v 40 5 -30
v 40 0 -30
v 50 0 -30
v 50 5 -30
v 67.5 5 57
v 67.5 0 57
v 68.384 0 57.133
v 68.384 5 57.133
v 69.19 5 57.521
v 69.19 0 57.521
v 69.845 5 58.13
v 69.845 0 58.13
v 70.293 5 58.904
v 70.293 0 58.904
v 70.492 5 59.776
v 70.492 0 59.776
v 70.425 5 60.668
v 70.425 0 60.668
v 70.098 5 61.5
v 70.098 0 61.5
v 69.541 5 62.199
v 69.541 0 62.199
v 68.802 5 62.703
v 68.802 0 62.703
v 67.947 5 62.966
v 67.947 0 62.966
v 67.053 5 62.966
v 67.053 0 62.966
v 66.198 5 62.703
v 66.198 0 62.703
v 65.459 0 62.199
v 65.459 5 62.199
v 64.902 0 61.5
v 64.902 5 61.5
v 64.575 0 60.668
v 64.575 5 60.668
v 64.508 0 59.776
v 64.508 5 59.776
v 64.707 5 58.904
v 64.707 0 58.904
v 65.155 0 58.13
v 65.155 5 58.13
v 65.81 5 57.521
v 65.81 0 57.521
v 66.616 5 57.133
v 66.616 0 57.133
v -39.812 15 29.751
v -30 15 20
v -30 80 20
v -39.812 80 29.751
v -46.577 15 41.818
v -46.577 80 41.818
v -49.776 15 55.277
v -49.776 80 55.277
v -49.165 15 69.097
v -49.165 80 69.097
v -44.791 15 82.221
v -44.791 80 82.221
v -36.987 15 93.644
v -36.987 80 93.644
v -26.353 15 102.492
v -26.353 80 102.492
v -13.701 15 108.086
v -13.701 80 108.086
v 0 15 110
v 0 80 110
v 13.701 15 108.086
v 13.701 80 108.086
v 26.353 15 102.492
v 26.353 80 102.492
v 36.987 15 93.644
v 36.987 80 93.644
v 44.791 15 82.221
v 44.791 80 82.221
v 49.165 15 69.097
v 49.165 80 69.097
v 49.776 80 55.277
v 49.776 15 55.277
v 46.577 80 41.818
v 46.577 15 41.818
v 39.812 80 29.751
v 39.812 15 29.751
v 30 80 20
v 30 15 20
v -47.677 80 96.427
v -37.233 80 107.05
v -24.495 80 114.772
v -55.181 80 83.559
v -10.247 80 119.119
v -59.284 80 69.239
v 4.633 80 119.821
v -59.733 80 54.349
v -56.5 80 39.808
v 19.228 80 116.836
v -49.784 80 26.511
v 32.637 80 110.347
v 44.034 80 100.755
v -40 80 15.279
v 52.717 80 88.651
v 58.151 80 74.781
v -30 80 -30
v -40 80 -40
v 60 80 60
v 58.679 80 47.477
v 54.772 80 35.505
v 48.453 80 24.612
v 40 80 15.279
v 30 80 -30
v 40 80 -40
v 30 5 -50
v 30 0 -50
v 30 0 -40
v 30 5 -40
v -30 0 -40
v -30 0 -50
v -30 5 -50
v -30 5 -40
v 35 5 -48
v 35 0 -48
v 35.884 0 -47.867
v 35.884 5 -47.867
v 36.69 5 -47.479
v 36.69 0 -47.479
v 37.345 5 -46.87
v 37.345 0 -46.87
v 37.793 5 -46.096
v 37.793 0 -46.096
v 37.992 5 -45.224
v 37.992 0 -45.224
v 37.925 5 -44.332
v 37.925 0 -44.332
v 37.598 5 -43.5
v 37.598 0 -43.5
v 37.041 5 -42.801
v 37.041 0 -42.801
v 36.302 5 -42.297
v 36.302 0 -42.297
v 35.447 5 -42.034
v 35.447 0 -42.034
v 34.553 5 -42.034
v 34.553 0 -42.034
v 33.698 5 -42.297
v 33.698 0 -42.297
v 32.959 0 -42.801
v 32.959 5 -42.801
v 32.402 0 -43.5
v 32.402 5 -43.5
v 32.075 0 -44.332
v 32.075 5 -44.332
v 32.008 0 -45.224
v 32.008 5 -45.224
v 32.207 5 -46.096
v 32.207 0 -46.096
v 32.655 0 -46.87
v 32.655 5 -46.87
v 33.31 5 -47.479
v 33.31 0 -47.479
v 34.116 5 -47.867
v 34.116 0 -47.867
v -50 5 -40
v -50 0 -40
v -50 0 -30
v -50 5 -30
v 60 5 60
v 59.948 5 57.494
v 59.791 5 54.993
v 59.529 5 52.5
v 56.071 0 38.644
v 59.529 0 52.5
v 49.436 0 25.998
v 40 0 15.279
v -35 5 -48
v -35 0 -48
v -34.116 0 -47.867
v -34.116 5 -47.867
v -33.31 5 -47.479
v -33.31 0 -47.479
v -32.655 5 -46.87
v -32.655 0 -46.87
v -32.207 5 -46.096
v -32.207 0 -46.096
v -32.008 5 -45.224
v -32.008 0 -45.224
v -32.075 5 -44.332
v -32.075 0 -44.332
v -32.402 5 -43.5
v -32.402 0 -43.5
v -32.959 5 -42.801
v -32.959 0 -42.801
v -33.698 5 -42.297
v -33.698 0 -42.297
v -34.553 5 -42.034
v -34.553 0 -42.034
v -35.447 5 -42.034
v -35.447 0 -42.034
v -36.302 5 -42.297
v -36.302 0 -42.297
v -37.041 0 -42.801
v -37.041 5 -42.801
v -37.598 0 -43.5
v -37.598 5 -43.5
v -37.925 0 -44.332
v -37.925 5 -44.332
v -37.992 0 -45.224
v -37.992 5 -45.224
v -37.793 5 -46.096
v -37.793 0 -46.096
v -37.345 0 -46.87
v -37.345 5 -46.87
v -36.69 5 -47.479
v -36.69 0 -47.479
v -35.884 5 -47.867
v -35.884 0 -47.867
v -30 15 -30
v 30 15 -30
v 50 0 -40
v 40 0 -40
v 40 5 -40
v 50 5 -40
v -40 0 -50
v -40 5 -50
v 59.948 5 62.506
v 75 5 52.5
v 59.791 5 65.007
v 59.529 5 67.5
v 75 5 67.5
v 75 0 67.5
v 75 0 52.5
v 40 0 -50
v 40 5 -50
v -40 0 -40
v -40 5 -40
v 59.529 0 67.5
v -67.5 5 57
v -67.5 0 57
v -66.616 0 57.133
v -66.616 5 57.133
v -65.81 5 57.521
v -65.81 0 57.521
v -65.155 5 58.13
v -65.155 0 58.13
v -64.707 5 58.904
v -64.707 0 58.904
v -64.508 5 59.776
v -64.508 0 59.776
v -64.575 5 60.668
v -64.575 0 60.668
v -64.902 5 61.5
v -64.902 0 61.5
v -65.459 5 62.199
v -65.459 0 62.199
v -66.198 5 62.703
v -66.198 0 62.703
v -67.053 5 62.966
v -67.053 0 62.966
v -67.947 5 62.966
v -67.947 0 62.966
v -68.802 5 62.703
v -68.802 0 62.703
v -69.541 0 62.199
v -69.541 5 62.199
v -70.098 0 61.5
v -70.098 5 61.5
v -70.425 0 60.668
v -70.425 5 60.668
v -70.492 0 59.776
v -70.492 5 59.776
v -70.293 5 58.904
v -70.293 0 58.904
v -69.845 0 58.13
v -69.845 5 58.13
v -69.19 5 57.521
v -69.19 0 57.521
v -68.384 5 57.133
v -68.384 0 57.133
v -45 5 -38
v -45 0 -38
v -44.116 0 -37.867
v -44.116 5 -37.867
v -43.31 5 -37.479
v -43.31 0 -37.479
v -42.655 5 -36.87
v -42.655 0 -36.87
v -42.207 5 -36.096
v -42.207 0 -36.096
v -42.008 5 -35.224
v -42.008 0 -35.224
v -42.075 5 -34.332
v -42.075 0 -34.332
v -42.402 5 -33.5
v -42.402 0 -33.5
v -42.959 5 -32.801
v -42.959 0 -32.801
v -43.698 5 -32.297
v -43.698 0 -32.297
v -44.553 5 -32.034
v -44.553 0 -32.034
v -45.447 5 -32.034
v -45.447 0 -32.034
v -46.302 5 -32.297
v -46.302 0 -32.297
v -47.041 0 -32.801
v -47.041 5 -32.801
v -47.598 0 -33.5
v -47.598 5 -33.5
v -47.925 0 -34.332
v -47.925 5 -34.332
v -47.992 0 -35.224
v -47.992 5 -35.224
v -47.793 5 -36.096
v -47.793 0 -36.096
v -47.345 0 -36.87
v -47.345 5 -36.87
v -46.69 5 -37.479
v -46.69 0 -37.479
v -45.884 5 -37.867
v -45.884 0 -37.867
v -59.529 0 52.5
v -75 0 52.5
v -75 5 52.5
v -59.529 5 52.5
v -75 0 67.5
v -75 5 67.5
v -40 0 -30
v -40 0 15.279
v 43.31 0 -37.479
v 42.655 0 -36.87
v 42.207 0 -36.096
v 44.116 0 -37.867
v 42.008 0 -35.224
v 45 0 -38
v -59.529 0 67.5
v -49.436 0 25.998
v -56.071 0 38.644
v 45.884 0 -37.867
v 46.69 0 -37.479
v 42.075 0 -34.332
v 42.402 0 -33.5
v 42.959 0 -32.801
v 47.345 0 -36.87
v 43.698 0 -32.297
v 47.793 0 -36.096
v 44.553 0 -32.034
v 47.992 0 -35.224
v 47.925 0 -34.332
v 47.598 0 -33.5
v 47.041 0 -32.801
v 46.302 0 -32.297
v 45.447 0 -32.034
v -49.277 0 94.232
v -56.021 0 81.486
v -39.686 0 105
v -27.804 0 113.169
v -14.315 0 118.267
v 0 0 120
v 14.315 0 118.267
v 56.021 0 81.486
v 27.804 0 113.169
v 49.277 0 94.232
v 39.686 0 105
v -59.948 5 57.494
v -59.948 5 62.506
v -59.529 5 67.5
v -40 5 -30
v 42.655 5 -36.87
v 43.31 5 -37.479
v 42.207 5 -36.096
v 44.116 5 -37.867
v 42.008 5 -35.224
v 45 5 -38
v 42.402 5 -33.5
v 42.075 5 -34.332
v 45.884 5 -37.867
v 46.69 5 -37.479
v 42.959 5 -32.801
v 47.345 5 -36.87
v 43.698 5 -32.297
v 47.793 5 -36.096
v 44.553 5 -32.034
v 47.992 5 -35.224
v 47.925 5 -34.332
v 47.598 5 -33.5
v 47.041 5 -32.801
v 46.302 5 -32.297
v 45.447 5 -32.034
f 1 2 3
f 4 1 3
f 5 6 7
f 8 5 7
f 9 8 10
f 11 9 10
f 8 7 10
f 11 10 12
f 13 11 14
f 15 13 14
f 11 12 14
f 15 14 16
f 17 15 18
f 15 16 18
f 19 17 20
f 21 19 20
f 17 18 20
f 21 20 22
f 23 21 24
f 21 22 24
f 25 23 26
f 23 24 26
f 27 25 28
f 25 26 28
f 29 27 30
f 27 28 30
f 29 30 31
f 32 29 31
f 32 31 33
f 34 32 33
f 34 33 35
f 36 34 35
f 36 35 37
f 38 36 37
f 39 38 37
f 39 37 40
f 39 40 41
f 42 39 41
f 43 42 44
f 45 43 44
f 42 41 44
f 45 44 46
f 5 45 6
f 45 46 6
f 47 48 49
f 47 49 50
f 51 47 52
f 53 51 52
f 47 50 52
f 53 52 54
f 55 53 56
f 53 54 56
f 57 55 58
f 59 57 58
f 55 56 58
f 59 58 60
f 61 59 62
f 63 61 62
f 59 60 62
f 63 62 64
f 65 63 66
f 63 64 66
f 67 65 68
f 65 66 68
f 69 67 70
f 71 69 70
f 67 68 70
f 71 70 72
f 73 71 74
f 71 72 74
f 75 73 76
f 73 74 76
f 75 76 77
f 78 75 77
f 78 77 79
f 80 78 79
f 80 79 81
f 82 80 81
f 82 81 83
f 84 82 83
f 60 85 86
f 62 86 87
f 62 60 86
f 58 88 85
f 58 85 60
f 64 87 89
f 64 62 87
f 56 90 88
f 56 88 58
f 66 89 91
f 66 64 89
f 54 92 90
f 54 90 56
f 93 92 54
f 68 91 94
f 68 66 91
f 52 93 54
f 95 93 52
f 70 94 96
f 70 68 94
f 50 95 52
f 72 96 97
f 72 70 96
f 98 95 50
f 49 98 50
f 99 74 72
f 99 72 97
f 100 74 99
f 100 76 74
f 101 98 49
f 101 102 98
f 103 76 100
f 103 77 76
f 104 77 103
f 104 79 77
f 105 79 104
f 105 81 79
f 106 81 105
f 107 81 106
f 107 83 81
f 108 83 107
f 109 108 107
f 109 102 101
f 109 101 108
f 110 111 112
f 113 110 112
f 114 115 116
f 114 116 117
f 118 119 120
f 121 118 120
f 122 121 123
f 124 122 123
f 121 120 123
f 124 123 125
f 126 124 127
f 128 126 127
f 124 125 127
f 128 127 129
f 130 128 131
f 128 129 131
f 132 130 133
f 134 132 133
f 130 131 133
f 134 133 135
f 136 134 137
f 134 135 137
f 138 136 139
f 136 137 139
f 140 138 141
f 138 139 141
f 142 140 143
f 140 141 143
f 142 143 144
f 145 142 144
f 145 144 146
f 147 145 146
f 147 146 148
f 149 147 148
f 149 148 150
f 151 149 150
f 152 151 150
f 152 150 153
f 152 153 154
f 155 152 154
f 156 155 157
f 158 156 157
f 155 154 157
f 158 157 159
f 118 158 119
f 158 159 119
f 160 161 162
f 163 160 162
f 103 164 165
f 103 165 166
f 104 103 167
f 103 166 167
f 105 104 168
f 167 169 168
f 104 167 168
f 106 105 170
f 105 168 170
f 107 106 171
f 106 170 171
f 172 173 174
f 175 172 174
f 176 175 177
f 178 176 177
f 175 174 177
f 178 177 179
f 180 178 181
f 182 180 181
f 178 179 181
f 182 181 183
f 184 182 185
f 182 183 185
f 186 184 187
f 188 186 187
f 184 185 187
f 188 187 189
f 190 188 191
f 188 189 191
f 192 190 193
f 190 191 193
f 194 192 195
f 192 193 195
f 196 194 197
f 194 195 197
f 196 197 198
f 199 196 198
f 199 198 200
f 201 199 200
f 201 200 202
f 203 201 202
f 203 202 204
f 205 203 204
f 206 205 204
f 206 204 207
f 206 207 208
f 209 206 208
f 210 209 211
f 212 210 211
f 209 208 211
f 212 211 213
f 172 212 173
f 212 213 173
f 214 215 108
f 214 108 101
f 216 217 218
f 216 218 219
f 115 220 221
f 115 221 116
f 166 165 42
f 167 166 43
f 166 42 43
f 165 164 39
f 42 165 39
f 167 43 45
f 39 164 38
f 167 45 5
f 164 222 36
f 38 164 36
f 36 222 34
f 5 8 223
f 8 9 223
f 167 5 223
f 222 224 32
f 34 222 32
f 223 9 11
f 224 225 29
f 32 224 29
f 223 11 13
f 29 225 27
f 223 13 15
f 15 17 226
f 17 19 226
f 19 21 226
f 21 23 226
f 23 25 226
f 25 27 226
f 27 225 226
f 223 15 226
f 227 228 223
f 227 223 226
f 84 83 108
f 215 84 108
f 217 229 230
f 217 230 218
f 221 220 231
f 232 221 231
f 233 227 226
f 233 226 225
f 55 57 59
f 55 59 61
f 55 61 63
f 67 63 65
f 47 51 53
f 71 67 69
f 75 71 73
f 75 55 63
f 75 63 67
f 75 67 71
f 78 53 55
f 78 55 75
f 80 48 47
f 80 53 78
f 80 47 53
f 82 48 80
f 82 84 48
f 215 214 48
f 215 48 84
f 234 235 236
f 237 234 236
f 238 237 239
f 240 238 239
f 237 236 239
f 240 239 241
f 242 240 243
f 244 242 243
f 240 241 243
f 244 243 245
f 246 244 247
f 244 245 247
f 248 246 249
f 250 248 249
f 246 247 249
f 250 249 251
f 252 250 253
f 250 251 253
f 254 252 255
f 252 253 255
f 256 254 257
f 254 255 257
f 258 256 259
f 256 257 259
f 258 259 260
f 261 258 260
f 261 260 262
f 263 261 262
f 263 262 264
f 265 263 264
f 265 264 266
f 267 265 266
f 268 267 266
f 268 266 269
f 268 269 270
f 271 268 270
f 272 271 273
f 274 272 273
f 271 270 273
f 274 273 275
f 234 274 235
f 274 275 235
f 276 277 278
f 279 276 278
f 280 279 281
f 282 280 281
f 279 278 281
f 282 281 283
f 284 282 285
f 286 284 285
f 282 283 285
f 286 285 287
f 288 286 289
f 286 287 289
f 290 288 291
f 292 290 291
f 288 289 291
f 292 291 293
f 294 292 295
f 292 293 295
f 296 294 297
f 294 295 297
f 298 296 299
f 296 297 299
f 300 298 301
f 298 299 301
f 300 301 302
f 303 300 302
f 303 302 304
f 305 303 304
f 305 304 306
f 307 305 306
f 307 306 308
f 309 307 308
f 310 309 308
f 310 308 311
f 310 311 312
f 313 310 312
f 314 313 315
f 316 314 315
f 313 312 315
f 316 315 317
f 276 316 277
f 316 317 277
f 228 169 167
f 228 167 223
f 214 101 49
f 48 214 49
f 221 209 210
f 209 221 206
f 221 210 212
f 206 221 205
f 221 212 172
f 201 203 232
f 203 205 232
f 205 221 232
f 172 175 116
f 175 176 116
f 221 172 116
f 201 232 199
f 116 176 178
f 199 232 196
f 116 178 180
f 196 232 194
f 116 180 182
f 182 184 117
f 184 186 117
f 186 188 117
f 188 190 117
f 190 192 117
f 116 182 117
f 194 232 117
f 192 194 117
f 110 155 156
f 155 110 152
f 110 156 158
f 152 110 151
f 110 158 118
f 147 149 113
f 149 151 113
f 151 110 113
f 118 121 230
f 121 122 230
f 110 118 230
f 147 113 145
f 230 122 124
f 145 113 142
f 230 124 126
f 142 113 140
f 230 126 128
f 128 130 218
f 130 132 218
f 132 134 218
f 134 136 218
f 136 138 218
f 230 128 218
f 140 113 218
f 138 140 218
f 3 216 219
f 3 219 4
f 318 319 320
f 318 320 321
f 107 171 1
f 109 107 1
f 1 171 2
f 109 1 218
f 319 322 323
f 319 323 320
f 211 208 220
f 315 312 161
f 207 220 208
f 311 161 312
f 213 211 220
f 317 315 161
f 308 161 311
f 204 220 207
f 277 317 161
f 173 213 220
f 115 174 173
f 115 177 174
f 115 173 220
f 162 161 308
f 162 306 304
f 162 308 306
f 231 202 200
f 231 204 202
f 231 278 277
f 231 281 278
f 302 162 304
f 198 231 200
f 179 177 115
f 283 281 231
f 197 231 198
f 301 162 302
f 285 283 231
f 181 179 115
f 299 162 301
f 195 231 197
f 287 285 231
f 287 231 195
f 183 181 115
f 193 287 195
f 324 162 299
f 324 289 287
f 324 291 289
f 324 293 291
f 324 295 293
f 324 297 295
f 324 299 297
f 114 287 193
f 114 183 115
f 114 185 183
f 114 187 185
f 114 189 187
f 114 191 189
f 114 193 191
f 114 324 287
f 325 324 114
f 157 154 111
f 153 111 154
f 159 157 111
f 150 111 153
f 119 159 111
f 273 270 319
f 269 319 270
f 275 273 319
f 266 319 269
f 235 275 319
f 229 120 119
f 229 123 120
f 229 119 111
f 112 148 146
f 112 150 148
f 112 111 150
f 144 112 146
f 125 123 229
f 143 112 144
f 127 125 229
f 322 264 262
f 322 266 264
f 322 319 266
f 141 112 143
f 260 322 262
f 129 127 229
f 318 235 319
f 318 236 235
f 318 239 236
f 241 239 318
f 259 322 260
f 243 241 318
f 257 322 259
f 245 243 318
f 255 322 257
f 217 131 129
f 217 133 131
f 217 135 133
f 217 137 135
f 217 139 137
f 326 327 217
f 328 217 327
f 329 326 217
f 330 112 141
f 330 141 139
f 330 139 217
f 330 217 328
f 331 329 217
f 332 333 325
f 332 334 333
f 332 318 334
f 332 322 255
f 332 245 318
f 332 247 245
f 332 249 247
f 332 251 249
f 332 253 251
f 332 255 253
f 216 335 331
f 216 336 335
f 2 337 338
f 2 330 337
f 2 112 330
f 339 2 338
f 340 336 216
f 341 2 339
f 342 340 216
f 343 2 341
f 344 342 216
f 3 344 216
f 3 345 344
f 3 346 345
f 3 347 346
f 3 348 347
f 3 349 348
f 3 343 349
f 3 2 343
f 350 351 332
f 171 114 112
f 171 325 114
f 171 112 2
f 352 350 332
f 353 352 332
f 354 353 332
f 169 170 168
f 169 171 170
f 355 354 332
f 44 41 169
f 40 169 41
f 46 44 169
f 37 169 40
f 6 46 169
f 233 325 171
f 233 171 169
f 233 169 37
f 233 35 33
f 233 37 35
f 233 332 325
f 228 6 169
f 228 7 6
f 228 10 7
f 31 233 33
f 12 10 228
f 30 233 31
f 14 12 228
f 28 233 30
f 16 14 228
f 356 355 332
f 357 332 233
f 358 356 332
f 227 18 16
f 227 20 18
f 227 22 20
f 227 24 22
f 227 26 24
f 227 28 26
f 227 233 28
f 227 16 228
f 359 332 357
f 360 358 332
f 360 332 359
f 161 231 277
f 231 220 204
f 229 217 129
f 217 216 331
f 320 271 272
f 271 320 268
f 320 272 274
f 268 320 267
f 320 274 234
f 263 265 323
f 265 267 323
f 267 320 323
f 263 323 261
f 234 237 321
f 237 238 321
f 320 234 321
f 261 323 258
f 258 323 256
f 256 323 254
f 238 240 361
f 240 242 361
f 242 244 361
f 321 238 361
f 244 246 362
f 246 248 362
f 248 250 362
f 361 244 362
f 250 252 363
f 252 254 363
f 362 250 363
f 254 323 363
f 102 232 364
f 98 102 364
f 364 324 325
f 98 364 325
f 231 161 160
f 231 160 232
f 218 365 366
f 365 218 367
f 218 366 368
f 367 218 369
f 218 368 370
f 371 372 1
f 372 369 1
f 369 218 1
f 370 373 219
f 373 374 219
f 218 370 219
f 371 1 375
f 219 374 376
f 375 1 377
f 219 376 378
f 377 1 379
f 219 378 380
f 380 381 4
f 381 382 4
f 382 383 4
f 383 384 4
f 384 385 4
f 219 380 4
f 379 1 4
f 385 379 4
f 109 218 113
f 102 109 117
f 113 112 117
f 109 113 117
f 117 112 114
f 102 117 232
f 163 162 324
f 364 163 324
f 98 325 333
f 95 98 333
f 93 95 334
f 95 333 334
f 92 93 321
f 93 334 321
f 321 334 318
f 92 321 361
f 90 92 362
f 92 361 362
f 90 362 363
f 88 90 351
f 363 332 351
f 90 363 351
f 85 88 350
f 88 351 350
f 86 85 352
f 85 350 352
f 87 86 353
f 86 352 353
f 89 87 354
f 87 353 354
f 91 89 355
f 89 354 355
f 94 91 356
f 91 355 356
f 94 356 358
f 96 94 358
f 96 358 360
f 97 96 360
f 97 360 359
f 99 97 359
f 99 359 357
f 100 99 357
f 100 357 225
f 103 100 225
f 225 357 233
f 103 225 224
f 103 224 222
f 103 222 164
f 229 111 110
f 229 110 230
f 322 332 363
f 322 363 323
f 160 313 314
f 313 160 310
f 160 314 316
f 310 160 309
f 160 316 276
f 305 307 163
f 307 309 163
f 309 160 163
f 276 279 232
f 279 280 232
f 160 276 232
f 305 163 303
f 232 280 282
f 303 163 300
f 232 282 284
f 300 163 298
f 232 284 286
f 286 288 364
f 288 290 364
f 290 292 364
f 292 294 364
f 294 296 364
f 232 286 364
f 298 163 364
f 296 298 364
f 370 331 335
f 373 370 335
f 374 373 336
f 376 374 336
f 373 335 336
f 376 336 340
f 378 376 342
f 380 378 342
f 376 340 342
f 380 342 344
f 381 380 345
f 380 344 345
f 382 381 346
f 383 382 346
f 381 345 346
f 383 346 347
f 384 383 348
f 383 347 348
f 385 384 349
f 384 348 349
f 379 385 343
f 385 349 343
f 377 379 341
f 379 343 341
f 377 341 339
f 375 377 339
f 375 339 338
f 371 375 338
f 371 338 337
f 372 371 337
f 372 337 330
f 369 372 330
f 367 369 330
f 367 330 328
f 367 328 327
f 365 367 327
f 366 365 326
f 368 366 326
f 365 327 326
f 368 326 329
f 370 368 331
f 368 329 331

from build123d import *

# Parameters (mm, degrees)
BOSS_EXTRUDE1_DEPTH = 80
CUT_EXTRUDE1_DEPTH  = 65
SKETCH3_R           = 3
SKETCH3_W           = 10
SKETCH3_H           = 10
BOSS_EXTRUDE2_DEPTH = 5


with BuildPart() as part:
    # Sketch1 → Boss-Extrude1 (new body)
    with BuildSketch(Plane(origin=(0, 0, 0), x_dir=(1, 0, 0), z_dir=(0, 1, 0))):
        with BuildLine():
            Line((-40, -40), (-40, -15.27864045))
            ThreePointArc((-40, -15.27864045), (-24.494897428, -114.772255751), (60, -60))
            ThreePointArc((60, -60), (54.772255751, -35.505102572), (40, -15.27864045))
            Line((40, -15.27864045), (40, -40))
            Line((40, -40), (-40, -40))
        make_face()
        with BuildLine():
            ThreePointArc((40, -15.27864045), (0, 0), (-40, -15.27864045))
            Line((-40, -15.27864045), (-40, -40))
            Line((-40, -40), (40, -40))
            Line((40, -40), (40, -15.27864045))
        make_face()
        with BuildLine():
            Line((40, 40), (-40, 40))
            Line((-40, 40), (-40, -15.27864045))
            ThreePointArc((-40, -15.27864045), (0, 0), (40, -15.27864045))
            Line((40, -15.27864045), (40, 40))
        make_face()
    extrude(amount=BOSS_EXTRUDE1_DEPTH)

    # Sketch2 → Cut-Extrude1 (cut)
    with BuildSketch(Plane(origin=(0, 80, 0), x_dir=(1, 0, 0), z_dir=(0, 1, 0))):
        with BuildLine():
            Line((30, 30), (-30, 30))
            Line((-30, 30), (-30, -20))
            ThreePointArc((-30, -20), (0, -10), (30, -20))
            Line((30, -20), (30, 30))
        make_face()
        with BuildLine():
            ThreePointArc((30, -20), (0, -10), (-30, -20))
            Line((-30, -20), (-30, -30))
            Line((-30, -30), (30, -30))
            Line((30, -30), (30, -20))
        make_face()
        with BuildLine():
            Line((-30, -30), (-30, -20))
            ThreePointArc((-30, -20), (-22.360679775, -104.72135955), (50, -60))
            ThreePointArc((50, -60), (44.72135955, -37.639320225), (30, -20))
            Line((30, -20), (30, -30))
            Line((30, -30), (-30, -30))
        make_face()
    extrude(amount=-CUT_EXTRUDE1_DEPTH, mode=Mode.SUBTRACT)

    # Sketch3 → Boss-Extrude2 (add)
    # profile 1 of 6: a face of its own
    with BuildSketch(Plane.XZ):
        with BuildLine():
            Line((-75, 52.5), (-59.529404499, 52.5))
            ThreePointArc((-59.529404499, 52.5), (-60, 60), (-59.529404499, 67.5))
            Line((-59.529404499, 67.5), (-75, 67.5))
            Line((-75, 67.5), (-75, 52.5))
        make_face()
        with Locations(Location((-67.5, 60, 0), (0, 0, 270))):
            Circle(SKETCH3_R, mode=Mode.SUBTRACT)
    # profile 2 of 6: a face of its own
    with BuildSketch(Plane.XZ):
        with BuildLine():
            ThreePointArc((59.529404499, 67.5), (60, 60), (59.529404499, 52.5))
            Line((59.529404499, 52.5), (75, 52.5))
            Line((75, 52.5), (75, 67.5))
            Line((75, 67.5), (59.529404499, 67.5))
        make_face()
        with Locations(Location((67.5, 60, 0), (0, 0, 270))):
            Circle(SKETCH3_R, mode=Mode.SUBTRACT)
    # profile 3 of 6: a face of its own
    with BuildSketch(Plane.XZ):
        with Locations((-45, -35)):
            Rectangle(SKETCH3_W, SKETCH3_H)
        with Locations(Location((-45, -35, 0), (0, 0, 270))):
            Circle(SKETCH3_R, mode=Mode.SUBTRACT)
    # profile 4 of 6: a face of its own
    with BuildSketch(Plane.XZ):
        with Locations((-35, -45)):
            Rectangle(SKETCH3_W, SKETCH3_H)
        with Locations(Location((-35, -45, 0), (0, 0, 270))):
            Circle(SKETCH3_R, mode=Mode.SUBTRACT)
    # profile 5 of 6: a face of its own
    with BuildSketch(Plane.XZ):
        with Locations((35, -45)):
            Rectangle(SKETCH3_W, SKETCH3_H)
        with Locations(Location((35, -45, 0), (0, 0, 270))):
            Circle(SKETCH3_R, mode=Mode.SUBTRACT)
    # profile 6 of 6: a face of its own
    with BuildSketch(Plane.XZ):
        with Locations((45, -35)):
            Rectangle(SKETCH3_W, SKETCH3_H)
        with Locations(Location((45, -35, 0), (0, 0, 270))):
            Circle(SKETCH3_R, mode=Mode.SUBTRACT)
    extrude(amount=-BOSS_EXTRUDE2_DEPTH)


solid = part.part
